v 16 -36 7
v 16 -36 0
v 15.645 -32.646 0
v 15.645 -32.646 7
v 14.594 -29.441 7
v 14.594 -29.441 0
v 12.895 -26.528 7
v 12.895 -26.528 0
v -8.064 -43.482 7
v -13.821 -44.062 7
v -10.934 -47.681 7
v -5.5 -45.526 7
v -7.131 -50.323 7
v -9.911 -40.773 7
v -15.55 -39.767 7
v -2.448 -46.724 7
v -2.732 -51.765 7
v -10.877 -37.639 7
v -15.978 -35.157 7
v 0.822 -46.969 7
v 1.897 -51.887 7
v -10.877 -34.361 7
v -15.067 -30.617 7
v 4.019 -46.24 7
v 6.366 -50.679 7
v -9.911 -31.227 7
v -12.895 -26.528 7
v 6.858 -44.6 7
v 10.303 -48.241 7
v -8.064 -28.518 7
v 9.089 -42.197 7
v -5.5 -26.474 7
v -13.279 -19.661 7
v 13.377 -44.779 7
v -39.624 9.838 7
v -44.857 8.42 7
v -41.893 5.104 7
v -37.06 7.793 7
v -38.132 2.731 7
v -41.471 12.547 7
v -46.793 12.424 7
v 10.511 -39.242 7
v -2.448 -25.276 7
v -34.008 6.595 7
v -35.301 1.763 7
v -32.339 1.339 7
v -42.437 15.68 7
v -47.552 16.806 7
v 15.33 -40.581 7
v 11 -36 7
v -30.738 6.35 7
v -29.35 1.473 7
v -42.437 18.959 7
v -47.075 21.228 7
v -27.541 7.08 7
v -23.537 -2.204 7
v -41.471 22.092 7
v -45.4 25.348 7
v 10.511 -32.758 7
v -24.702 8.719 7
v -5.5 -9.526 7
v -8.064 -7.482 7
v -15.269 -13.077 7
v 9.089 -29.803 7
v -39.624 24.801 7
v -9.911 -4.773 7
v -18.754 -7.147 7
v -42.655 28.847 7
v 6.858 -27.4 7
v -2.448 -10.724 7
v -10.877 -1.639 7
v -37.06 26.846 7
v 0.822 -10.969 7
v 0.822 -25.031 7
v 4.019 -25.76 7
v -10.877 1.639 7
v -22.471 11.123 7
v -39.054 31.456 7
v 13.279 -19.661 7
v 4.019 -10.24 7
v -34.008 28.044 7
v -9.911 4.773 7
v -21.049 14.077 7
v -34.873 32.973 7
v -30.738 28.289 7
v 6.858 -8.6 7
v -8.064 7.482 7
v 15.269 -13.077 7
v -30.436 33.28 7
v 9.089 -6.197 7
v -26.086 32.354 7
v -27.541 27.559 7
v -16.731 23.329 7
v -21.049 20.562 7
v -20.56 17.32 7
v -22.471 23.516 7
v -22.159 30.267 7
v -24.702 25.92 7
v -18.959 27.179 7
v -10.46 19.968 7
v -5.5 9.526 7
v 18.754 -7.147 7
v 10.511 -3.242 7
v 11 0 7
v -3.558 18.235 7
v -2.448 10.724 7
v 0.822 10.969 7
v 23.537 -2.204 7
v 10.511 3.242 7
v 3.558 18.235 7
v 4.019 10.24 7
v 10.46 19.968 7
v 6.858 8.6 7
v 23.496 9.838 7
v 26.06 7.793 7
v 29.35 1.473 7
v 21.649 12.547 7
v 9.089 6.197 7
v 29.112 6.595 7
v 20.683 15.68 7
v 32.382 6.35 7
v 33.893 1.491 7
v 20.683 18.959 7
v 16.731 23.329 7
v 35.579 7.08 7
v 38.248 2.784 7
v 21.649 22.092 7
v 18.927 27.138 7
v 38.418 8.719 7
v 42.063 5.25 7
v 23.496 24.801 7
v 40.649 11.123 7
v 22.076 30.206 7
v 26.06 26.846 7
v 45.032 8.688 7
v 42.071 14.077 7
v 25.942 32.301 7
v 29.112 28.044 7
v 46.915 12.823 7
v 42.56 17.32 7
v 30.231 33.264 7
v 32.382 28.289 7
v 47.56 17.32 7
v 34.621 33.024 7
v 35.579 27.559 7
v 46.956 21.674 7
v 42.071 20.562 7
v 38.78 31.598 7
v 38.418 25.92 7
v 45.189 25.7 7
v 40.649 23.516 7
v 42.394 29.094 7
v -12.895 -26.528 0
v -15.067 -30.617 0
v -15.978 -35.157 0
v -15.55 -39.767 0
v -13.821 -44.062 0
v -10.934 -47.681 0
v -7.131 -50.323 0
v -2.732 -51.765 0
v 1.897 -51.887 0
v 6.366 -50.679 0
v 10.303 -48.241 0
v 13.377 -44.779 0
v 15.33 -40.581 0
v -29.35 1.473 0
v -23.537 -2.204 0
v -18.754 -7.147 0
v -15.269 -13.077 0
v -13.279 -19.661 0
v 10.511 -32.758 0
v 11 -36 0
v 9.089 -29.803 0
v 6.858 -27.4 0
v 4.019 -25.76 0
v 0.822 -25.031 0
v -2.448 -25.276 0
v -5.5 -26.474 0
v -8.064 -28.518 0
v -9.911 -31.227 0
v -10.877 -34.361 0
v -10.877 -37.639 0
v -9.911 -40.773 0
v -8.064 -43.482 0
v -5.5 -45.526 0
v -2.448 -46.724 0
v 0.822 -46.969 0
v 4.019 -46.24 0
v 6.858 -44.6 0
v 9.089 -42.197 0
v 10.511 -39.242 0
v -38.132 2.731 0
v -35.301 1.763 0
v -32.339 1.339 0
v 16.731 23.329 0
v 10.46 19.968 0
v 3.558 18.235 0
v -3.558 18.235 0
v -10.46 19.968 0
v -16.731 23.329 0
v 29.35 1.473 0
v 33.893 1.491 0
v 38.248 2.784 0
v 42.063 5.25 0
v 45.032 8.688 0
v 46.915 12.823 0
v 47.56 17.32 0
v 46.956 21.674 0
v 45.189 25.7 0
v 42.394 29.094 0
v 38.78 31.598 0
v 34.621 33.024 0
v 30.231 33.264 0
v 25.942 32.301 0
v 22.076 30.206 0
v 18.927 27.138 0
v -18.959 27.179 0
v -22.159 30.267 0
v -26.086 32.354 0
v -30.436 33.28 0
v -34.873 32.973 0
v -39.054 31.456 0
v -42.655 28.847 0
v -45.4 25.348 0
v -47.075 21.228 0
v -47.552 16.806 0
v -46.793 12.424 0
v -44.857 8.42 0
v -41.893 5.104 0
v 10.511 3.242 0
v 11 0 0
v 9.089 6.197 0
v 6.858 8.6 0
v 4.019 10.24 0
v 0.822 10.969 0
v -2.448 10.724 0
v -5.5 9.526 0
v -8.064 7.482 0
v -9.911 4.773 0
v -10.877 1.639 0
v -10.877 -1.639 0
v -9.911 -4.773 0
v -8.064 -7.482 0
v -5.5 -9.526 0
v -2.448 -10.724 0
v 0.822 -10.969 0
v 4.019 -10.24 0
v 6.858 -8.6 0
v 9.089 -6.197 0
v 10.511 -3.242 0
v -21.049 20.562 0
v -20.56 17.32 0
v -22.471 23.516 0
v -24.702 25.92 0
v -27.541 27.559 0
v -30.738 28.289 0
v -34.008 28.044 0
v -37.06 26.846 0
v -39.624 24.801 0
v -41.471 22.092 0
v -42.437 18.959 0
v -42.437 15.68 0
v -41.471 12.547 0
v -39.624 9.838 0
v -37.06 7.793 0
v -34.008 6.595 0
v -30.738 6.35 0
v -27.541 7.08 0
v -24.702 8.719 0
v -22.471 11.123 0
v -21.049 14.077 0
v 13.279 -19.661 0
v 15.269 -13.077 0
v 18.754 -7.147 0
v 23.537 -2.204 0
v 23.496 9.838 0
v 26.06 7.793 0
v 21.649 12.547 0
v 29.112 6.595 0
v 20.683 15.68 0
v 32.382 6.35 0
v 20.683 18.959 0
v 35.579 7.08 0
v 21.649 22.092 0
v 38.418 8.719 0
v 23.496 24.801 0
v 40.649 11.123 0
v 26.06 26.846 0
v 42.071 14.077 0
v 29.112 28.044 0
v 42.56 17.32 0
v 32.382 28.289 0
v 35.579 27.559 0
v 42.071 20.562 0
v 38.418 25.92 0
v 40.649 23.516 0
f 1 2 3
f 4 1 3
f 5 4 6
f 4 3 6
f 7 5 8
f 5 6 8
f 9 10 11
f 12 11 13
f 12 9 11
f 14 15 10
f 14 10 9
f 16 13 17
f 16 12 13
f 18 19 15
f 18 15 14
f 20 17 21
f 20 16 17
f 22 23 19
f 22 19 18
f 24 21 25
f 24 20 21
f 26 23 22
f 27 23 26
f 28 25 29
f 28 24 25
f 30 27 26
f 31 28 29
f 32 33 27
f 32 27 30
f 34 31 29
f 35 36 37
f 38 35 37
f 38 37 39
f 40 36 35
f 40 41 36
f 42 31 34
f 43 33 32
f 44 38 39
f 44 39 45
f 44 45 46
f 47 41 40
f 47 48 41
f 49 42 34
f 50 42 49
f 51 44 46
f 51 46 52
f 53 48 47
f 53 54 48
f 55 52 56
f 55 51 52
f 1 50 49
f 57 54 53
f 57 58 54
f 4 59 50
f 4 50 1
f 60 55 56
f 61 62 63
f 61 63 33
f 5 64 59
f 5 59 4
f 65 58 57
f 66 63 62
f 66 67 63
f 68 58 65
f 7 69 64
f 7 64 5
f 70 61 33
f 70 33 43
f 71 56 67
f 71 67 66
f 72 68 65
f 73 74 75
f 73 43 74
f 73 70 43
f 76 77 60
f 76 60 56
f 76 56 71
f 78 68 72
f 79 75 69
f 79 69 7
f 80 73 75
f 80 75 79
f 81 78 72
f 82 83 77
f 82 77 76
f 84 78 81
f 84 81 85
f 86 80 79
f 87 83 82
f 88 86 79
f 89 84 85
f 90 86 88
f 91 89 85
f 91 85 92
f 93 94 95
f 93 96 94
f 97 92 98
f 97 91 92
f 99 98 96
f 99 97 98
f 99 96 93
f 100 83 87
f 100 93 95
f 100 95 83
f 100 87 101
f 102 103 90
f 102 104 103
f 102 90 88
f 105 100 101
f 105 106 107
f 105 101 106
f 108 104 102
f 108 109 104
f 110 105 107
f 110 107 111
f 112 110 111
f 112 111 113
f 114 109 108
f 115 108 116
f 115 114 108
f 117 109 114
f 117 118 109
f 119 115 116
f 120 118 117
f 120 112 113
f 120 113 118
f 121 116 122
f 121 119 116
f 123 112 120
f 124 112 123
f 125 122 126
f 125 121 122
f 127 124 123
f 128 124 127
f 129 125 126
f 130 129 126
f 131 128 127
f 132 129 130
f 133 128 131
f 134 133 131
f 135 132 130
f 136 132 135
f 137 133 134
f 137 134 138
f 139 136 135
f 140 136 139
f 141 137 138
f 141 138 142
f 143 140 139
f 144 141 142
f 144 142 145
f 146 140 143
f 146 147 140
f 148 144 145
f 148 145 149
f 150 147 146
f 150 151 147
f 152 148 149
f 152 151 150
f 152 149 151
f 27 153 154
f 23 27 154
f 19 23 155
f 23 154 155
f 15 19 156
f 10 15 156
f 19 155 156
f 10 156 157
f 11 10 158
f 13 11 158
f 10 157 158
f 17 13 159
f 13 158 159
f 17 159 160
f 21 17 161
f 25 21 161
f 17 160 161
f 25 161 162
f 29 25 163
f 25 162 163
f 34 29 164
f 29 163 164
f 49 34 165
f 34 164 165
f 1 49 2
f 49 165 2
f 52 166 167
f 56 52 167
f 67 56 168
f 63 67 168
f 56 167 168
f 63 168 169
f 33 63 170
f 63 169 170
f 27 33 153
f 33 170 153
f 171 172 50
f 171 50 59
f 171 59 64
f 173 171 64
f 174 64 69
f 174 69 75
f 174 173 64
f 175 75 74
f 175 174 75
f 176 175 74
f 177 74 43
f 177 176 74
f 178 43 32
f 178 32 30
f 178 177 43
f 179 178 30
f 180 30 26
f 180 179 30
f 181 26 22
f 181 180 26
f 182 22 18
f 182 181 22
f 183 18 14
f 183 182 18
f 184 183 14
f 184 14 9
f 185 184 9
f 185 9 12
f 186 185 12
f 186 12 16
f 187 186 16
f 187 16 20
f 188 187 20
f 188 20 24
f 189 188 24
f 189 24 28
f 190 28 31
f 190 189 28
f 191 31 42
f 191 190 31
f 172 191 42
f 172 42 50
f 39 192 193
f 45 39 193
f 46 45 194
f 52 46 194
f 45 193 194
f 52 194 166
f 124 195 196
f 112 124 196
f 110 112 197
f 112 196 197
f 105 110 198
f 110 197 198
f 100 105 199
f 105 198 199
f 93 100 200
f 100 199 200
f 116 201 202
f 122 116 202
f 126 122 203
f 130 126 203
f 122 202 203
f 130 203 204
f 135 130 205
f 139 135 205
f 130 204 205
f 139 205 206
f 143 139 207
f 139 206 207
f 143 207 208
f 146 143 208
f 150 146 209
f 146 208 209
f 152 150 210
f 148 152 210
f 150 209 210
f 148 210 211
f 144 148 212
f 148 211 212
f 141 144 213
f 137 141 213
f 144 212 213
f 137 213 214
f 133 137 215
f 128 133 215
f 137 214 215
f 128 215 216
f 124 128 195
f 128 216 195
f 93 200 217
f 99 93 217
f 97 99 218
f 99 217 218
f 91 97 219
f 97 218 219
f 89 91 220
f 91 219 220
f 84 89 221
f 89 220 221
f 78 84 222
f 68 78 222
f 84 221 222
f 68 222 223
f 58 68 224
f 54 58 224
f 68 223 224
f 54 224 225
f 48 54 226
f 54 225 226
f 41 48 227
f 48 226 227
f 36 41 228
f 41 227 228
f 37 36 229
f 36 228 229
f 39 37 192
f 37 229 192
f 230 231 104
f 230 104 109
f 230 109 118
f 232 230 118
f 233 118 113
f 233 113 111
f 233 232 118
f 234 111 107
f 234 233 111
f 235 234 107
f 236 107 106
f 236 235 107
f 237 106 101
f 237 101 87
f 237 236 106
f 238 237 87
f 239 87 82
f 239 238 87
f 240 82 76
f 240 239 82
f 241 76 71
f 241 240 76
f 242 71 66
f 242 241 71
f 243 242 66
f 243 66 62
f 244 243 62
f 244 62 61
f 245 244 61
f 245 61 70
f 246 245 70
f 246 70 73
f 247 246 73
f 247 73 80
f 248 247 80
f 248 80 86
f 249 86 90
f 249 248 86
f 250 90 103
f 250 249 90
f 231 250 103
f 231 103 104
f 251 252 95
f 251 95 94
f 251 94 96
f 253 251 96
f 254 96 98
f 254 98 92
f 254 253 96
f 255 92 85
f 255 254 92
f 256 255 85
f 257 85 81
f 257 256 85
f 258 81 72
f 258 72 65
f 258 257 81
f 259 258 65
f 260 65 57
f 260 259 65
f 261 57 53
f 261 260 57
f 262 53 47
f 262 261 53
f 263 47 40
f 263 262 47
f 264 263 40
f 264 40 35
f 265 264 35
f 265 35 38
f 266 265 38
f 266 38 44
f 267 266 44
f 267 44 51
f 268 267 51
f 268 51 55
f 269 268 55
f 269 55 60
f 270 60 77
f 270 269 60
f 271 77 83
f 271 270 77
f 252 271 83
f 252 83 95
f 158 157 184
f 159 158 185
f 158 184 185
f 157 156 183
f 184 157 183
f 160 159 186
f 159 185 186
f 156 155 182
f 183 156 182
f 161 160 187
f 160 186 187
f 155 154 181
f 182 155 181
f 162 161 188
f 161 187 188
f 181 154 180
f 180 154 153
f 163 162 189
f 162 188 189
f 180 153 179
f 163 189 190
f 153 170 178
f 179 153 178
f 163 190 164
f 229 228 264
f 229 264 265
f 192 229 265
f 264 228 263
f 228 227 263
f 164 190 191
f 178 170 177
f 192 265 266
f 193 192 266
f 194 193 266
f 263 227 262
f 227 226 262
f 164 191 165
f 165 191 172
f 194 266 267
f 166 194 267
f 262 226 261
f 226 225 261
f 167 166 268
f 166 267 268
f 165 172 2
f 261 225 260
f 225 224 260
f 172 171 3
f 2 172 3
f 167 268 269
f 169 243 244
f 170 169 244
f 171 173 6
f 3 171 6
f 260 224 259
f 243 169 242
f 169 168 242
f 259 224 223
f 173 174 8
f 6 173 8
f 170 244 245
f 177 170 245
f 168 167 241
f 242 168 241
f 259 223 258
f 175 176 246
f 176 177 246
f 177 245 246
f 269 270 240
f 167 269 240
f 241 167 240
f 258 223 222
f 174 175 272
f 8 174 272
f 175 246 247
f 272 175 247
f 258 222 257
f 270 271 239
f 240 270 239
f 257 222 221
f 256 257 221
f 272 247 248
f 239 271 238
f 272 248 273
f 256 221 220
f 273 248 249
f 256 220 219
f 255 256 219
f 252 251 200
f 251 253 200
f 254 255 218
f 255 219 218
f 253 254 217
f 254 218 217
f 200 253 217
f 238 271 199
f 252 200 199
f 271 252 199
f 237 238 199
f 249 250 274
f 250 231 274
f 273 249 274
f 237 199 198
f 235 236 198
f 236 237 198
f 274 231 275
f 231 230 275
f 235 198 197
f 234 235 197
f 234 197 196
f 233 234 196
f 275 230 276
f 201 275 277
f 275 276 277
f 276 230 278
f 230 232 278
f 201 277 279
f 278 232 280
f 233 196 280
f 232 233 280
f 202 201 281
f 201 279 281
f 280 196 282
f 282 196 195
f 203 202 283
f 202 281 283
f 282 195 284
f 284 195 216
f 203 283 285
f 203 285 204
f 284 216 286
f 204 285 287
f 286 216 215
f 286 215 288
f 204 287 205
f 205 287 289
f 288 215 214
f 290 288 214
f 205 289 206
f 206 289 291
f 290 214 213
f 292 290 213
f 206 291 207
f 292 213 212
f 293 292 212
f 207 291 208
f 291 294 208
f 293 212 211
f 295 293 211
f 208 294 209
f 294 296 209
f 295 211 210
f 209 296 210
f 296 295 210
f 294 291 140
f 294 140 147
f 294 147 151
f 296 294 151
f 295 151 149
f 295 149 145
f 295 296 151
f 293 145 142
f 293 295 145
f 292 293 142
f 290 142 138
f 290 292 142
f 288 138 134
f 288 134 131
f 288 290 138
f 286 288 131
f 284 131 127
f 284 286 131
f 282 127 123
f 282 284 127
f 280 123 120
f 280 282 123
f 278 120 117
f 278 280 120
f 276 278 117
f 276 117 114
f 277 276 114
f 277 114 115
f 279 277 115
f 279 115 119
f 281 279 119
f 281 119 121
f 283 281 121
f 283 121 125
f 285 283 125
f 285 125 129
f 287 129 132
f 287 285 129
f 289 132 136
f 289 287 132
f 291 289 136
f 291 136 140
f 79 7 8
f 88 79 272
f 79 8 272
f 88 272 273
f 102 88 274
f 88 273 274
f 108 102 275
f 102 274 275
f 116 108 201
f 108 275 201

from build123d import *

# Parameters (mm, degrees)
F0_R     = 11
F1_DEPTH = 7
F2_DEPTH = 7


# Not quite as in the source:
# - a feature names something its author has since deleted; it is built from what else it names


with BuildPart() as f1:
    # F0 (on Top) → F1 (new body)
    with BuildSketch(Plane.XY):
        with BuildLine():
            ThreePointArc((29.3501442774, 1.4728811124), (17.7035935394, 9.3195381001), (16.7314646223, 23.3290753994))
            ThreePointArc((16.7314646223, 23.3290753994), (0, 18.0157402468), (-16.7314646223, 23.3290753994))
            ThreePointArc((-16.7314646223, 23.3290753994), (-15.8555966996, 20.3808641164), (-15.56, 17.3195381001))
            ThreePointArc((-15.56, 17.3195381001), (-19.4902507988, 6.8161503505), (-29.3501442774, 1.4728811124))
            ThreePointArc((-29.3501442774, 1.4728811124), (-16.8351135056, -10.0081099666), (-12.8952216464, -26.5282916699))
            ThreePointArc((-12.8952216464, -26.5282916699), (-0.0001071921, -20.0000000004), (12.8950947338, -26.5281188876))
            ThreePointArc((12.8950947338, -26.5281188876), (16.8350899961, -10.0080120701), (29.3501442774, 1.4728811124))
        make_face()
        Circle(F0_R, mode=Mode.SUBTRACT)
    extrude(amount=F1_DEPTH)

    # F0 (on Top) → F2 (join)
    with BuildSketch(Plane.XY):
        with BuildLine():
            ThreePointArc((29.3501442774, 1.4728811124), (42.0633877496, 5.2497888988), (47.56, 17.3195381001))
            ThreePointArc((47.56, 17.3195381001), (34.6213260163, 33.0239414005), (16.7314646223, 23.3290753994))
            ThreePointArc((16.7314646223, 23.3290753994), (17.7035935394, 9.3195381001), (29.3501442774, 1.4728811124))
        make_face()
        with Locations((31.56, 17.3195381001)):
            Circle(F0_R, mode=Mode.SUBTRACT)
        with BuildLine():
            ThreePointArc((-15.56, 17.3195381001), (-15.8555966996, 20.3808641164), (-16.7314646223, 23.3290753994))
            ThreePointArc((-16.7314646223, 23.3290753994), (-42.6554805123, 28.8473441446), (-38.1316823001, 2.7314267848))
            ThreePointArc((-38.1316823001, 2.7314267848), (-33.8298826127, 1.4813679746), (-29.3501442774, 1.4728811124))
            ThreePointArc((-29.3501442774, 1.4728811124), (-19.4902507988, 6.8161503505), (-15.56, 17.3195381001))
        make_face()
        with Locations((-31.56, 17.3195381001)):
            Circle(F0_R, mode=Mode.SUBTRACT)
        with BuildLine():
            ThreePointArc((16, -36), (15.2039717794, -31.0161017135), (12.8950947338, -26.5281188876))
            ThreePointArc((12.8950947338, -26.5281188876), (-0.0001071921, -20.0000000004), (-12.8952216464, -26.5282916699))
            ThreePointArc((-12.8952216464, -26.5282916699), (-4.9837964273, -51.2040051687), (16, -36))
        make_face()
        with Locations((0, -36)):
            Circle(F0_R, mode=Mode.SUBTRACT)
    extrude(amount=F2_DEPTH)


solid = f1.part
